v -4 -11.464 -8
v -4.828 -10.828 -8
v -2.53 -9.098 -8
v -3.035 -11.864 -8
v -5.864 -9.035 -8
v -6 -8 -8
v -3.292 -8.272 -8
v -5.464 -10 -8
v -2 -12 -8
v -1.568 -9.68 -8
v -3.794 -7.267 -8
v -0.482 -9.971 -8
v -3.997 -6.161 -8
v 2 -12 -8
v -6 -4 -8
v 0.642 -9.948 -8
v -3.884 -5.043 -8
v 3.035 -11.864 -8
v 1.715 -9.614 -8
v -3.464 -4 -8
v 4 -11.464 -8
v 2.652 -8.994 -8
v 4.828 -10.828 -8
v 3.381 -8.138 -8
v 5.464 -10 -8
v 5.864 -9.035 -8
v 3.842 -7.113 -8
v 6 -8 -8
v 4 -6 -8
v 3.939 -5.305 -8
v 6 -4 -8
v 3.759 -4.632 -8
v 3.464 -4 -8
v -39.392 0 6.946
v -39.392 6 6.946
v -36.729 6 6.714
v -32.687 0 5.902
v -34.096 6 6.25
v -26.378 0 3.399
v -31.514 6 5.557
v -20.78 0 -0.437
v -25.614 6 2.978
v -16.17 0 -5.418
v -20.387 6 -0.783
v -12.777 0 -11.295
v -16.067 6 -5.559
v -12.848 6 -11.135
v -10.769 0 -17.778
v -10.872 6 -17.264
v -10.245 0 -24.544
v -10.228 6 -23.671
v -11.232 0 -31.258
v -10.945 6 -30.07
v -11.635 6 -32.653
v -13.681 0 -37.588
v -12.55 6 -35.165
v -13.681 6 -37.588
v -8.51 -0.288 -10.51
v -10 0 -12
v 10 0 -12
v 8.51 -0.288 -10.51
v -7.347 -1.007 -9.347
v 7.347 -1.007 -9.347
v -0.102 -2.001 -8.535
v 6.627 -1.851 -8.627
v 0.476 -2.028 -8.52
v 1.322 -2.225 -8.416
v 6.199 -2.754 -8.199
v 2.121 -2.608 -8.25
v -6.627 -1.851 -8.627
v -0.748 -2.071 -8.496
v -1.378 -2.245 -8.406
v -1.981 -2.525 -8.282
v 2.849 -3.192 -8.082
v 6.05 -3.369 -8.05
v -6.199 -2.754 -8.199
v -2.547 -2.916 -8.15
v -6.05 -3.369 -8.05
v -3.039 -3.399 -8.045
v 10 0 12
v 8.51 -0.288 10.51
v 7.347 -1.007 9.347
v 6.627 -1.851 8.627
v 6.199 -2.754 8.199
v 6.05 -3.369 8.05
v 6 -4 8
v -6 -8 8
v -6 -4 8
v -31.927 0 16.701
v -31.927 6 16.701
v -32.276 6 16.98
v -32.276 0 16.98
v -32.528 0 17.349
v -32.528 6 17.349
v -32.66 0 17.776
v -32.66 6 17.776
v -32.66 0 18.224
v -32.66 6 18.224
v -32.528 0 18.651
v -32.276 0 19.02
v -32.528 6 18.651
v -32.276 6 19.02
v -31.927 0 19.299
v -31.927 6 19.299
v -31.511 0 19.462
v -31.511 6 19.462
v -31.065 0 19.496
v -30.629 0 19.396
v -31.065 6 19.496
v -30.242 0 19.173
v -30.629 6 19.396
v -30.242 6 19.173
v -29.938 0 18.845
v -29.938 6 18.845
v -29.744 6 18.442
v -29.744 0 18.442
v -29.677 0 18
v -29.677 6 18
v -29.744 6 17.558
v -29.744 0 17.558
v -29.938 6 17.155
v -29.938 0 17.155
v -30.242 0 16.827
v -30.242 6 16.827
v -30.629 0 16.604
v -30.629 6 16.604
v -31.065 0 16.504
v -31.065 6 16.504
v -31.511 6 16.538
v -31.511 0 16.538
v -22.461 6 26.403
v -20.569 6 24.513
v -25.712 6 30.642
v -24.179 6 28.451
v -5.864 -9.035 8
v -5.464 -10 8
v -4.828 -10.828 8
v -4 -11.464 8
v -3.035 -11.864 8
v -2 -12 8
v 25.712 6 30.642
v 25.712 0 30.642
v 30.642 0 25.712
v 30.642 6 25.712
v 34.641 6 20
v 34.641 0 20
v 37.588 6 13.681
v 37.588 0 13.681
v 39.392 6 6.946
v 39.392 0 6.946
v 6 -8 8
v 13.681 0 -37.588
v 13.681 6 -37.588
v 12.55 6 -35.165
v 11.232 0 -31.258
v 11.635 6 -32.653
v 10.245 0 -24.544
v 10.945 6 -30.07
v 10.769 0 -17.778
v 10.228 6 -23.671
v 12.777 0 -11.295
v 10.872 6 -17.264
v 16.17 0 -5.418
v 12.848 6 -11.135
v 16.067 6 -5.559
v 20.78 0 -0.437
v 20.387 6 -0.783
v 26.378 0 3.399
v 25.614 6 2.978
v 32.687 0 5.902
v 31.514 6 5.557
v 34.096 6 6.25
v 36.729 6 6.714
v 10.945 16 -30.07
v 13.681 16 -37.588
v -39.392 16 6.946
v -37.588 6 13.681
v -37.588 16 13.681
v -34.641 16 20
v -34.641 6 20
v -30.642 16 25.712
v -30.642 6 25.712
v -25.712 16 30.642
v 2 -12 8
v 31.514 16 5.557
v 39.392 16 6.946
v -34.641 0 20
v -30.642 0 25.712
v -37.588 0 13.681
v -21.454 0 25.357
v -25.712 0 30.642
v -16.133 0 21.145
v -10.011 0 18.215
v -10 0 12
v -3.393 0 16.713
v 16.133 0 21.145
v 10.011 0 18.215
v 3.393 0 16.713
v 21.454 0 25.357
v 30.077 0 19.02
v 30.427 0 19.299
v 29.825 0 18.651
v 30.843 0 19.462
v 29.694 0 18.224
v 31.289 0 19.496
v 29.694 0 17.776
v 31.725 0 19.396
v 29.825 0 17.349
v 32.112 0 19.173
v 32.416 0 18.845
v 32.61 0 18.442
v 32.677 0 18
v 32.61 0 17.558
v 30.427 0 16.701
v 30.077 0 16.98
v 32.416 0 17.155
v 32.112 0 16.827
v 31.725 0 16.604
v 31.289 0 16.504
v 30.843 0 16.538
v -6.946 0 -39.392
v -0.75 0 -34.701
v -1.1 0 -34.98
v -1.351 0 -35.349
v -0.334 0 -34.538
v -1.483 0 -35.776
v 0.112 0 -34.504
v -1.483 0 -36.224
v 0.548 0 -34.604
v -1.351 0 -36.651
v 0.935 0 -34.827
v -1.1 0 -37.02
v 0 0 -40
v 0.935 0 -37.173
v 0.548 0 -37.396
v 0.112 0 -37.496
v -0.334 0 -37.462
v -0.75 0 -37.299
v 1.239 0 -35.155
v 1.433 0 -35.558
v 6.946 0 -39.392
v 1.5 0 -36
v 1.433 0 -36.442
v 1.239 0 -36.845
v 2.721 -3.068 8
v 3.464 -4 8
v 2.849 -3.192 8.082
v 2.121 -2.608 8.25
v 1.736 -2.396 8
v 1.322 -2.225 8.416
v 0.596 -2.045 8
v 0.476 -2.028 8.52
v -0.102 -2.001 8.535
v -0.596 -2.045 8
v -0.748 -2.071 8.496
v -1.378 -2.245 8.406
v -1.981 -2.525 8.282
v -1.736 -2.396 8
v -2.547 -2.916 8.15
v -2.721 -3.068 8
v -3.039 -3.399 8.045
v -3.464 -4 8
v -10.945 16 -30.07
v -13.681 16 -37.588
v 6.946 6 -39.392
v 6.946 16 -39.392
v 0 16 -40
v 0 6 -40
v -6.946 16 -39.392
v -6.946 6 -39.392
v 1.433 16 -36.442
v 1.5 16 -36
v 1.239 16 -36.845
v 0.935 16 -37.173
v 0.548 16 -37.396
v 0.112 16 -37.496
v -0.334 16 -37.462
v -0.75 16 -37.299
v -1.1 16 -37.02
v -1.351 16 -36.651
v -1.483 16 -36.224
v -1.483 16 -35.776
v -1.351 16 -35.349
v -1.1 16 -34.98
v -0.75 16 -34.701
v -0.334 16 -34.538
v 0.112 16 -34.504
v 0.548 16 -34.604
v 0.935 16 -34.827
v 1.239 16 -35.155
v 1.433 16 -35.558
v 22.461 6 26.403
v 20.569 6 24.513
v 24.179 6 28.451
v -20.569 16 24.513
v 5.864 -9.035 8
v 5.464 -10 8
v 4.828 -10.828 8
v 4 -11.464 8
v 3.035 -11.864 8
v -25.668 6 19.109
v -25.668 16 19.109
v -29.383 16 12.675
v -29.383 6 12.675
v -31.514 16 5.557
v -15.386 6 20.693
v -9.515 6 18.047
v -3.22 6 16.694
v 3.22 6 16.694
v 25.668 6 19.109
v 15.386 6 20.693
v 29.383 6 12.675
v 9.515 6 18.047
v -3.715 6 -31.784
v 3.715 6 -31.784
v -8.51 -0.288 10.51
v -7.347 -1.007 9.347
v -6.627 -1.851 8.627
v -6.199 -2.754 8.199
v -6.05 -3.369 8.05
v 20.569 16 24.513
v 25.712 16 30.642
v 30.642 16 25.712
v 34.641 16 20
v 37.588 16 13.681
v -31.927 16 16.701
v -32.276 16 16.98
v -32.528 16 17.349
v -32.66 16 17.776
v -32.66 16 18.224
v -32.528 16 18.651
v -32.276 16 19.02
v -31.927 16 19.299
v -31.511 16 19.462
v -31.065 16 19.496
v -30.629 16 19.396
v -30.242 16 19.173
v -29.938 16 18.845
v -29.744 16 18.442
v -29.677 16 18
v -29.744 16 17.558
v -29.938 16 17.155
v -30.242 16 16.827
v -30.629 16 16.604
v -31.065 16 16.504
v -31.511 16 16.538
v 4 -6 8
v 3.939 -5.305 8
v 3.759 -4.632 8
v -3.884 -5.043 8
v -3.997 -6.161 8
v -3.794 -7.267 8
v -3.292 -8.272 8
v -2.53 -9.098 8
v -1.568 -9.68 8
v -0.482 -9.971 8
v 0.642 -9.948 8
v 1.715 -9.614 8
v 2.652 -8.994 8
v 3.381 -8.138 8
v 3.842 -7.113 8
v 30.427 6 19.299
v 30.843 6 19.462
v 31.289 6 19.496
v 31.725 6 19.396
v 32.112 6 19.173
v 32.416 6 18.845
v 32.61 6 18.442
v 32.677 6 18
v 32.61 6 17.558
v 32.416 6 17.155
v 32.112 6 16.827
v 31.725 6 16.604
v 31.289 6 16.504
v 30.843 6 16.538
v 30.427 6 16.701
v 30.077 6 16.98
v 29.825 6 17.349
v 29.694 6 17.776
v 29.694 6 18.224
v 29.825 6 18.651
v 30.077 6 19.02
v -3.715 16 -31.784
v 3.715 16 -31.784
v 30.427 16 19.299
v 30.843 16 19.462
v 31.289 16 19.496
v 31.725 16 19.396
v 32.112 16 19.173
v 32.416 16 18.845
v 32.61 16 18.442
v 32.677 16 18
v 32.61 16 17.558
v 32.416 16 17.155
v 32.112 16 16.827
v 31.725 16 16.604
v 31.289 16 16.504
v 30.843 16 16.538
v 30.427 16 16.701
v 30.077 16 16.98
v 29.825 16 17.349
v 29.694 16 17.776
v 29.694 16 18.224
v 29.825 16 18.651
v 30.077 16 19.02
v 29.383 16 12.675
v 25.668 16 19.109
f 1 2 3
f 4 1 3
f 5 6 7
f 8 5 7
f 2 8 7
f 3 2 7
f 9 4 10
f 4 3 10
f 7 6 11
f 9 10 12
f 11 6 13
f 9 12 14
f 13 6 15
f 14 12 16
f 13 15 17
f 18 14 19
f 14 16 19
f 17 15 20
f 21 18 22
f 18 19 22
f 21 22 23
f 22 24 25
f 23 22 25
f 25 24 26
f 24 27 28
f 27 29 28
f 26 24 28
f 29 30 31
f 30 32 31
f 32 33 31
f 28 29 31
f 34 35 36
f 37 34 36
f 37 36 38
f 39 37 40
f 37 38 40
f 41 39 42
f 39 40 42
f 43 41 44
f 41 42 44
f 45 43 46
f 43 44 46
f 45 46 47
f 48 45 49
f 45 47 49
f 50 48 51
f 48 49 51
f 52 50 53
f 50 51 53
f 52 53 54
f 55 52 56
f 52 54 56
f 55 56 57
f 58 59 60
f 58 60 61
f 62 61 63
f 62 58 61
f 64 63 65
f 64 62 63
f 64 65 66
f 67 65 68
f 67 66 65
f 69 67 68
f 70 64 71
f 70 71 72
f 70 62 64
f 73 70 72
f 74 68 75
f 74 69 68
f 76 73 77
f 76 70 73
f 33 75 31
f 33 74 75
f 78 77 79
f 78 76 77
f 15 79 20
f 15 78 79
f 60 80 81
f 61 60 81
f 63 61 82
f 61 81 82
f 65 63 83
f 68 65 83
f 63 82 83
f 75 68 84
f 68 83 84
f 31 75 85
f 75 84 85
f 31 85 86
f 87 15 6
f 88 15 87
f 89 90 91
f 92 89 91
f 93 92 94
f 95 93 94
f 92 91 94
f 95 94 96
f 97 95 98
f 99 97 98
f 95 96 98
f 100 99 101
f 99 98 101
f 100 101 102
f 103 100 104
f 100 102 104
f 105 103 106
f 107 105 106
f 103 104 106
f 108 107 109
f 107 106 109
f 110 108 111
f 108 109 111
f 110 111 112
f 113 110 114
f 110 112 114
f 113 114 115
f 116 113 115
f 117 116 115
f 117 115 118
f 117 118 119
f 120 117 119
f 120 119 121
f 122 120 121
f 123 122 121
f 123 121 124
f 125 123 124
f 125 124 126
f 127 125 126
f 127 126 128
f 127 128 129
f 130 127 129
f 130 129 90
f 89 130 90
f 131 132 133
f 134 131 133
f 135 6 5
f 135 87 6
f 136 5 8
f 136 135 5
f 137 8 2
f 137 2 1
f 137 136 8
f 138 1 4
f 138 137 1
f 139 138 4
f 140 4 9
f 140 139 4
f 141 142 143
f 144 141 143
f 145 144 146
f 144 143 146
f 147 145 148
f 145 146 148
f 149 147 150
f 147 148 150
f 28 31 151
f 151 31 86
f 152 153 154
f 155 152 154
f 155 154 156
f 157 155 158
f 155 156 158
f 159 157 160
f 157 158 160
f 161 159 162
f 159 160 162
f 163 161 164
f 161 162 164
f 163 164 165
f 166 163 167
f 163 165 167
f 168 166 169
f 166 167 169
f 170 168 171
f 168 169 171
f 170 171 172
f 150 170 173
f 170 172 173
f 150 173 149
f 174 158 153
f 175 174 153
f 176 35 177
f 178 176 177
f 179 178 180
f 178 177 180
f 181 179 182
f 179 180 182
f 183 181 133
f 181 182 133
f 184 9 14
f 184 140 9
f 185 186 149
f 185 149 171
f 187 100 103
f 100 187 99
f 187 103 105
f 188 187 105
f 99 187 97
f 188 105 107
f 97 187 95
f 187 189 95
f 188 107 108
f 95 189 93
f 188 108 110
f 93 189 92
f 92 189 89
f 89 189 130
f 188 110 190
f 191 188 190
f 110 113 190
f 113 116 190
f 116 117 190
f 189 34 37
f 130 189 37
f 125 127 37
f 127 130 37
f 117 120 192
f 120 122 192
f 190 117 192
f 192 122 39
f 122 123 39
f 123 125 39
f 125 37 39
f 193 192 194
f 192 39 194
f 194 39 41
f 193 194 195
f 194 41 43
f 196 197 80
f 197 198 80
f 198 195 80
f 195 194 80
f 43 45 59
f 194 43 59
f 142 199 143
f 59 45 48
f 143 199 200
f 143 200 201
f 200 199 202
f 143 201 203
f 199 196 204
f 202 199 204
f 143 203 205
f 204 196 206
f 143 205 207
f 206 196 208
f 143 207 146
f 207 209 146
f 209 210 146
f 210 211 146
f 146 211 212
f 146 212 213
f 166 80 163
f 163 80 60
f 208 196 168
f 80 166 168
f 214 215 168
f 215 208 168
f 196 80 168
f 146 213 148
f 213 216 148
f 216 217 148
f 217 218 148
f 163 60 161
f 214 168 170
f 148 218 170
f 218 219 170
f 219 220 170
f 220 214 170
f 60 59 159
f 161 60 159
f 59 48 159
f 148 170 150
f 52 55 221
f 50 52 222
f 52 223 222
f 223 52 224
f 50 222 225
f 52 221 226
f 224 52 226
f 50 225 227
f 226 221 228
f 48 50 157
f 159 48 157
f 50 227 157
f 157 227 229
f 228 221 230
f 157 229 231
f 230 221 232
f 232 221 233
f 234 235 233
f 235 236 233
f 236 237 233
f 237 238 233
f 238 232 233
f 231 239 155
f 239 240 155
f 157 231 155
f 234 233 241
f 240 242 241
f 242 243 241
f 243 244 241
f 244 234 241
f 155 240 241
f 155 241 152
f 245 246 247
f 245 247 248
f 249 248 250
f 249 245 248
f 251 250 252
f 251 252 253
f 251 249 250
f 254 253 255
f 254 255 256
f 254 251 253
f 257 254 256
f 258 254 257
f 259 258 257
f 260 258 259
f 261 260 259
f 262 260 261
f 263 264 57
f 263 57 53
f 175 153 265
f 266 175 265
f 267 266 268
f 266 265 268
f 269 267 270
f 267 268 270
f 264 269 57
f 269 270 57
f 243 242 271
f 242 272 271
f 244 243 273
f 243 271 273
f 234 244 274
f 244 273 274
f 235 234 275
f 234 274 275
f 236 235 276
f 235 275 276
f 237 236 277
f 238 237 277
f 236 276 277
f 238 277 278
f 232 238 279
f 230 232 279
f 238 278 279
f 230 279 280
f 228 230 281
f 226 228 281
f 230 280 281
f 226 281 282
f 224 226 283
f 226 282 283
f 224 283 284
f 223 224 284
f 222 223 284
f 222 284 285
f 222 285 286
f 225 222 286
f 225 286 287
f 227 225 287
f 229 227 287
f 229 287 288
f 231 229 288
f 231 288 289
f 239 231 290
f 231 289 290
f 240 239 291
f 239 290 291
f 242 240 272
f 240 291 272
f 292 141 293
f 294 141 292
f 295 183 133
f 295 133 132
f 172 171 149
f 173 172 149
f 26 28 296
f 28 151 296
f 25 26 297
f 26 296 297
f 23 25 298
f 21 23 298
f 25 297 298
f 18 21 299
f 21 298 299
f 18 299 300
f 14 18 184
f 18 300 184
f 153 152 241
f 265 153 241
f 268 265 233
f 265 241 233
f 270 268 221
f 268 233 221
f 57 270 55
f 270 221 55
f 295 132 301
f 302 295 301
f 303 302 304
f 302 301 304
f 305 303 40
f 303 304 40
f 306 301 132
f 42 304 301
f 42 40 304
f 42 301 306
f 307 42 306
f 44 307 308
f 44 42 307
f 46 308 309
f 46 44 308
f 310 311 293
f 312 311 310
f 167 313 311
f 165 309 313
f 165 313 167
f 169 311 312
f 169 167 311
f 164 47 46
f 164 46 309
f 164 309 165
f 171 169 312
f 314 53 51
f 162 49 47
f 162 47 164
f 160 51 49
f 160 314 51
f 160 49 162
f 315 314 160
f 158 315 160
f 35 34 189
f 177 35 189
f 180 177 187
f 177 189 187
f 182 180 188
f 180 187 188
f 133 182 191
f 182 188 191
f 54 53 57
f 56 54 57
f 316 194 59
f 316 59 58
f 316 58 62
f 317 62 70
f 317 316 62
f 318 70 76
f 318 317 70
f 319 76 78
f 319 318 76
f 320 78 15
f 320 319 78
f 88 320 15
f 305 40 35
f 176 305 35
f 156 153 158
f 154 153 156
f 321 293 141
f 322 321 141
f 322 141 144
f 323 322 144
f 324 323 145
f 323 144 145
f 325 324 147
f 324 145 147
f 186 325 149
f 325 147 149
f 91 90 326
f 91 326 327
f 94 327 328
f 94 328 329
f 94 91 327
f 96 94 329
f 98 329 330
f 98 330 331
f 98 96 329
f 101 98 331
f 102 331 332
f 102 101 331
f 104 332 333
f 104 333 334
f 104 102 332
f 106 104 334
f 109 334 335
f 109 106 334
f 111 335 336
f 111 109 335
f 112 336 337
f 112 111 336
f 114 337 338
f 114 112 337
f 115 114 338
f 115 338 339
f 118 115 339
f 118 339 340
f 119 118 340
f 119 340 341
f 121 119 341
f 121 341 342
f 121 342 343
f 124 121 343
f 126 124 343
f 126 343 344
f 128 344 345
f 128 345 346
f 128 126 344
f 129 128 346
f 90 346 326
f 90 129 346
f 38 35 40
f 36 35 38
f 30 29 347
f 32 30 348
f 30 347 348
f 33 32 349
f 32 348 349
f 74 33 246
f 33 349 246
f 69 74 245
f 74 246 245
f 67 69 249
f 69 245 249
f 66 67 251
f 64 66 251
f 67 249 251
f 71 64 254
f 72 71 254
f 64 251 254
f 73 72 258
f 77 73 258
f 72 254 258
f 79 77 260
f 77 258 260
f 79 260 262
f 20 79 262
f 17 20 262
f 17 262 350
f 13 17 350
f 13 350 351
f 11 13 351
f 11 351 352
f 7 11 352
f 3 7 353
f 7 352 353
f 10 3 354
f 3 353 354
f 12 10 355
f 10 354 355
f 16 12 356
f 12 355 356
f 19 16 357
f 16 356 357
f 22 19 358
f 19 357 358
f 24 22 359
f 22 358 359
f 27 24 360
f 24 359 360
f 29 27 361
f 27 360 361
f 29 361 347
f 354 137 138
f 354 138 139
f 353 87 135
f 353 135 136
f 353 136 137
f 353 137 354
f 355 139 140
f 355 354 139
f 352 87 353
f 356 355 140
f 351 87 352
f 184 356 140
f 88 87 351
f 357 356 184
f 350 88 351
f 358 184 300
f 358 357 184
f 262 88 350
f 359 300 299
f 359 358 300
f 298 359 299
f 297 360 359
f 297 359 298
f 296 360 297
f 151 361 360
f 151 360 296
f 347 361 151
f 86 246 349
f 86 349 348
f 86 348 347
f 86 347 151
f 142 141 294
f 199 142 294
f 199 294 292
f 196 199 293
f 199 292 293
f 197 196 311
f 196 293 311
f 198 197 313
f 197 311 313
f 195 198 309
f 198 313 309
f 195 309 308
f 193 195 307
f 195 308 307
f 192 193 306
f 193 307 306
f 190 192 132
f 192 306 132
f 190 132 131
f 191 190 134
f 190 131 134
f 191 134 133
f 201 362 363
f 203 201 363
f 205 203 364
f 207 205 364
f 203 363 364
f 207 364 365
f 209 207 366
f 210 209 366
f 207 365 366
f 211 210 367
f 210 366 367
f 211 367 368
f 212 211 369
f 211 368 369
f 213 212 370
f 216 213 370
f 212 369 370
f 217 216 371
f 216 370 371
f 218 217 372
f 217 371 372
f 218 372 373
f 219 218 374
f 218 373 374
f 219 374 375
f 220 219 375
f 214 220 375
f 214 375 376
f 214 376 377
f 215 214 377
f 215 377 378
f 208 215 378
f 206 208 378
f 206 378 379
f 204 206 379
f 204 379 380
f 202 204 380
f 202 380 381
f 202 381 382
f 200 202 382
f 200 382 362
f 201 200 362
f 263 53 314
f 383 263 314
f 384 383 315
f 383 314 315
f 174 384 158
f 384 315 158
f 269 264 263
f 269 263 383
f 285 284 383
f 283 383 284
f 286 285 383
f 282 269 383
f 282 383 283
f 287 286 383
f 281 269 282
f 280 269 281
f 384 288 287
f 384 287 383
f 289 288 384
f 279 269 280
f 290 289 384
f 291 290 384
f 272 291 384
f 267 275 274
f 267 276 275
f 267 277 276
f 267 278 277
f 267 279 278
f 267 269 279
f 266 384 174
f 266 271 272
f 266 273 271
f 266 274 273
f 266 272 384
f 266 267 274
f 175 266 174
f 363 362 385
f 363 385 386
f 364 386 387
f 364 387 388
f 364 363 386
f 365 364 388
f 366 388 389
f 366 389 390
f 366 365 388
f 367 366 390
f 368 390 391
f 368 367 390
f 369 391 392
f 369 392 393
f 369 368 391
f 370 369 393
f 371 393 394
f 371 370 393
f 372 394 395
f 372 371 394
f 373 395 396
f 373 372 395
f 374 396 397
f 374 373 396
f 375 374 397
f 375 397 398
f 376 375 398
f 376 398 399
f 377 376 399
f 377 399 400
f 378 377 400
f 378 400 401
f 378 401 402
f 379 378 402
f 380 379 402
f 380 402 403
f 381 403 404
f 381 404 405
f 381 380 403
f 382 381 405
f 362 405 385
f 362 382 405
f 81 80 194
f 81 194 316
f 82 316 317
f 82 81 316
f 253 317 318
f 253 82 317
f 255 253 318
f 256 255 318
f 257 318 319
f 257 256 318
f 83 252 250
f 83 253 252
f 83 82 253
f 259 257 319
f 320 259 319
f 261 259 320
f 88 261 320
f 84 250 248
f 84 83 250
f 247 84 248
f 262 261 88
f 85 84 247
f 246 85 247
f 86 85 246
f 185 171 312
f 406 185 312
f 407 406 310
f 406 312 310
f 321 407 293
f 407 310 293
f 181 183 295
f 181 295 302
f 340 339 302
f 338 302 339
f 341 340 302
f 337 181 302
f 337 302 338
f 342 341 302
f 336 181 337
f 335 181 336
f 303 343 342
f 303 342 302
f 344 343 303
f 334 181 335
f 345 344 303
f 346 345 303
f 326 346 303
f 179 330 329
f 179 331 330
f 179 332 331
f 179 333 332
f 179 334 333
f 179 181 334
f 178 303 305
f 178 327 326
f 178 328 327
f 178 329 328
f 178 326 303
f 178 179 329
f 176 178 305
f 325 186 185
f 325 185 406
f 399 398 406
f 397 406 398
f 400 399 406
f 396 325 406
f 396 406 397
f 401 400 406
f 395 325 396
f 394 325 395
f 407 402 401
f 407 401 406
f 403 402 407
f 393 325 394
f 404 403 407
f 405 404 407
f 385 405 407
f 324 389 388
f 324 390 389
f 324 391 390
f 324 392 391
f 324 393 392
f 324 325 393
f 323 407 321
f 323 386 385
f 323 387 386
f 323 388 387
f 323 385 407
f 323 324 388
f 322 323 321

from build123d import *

# Parameters (mm, degrees)
SKETCH1_R                = 40
BOSS_EXTRUDE1_DEPTH      = 6
SKETCH2_R                = 1.5
BOSS_EXTRUDE2_DEPTH      = 10
SKETCH16_R               = 1.5
CUT_EXTRUDE9_DEPTH       = 17
CIRPATTERN1_COUNT        = 3
SKETCH5_R                = 30.471270003
CUT_EXTRUDE3_DEPTH       = 7
CIRPATTERN2_COUNT        = 3
SKETCH17_W               = 12
SKETCH17_H               = 16
BOSS_EXTRUDE3_DEPTH      = 12
FILLET1_R                = 4
FILLET2_R                = 4
SKETCH18_R               = 4
CUT_EXTRUDE10_DEPTH      = 23.641777725
CUT_EXTRUDE10_DEPTH_BACK = 49


with BuildPart() as part:
    # Sketch1 → Boss-Extrude1 (new body)
    with BuildSketch(Plane(origin=(0, 0, 0), x_dir=(1, 0, 0), z_dir=(0, 1, 0))):
        Circle(SKETCH1_R)
    extrude(amount=BOSS_EXTRUDE1_DEPTH)

    # Sketch2 → Boss-Extrude2 (add)
    with BuildSketch(Plane(origin=(0, 6, 0), x_dir=(1, 0, 0), z_dir=(0, 1, 0))):
        with BuildLine():
            Line((-13.680805733, 37.587704831), (-10.944644586, 30.070163865))
            ThreePointArc((-10.944644586, 30.070163865), (0, 32), (10.944644586, 30.070163865))
            Line((10.944644586, 30.070163865), (13.680805733, 37.587704831))
            ThreePointArc((13.680805733, 37.587704831), (0, 40), (-13.680805733, 37.587704831))
        make_face()
        with Locations((0, 36)):
            Circle(SKETCH2_R, mode=Mode.SUBTRACT)
    boss_extrude2 = extrude(amount=BOSS_EXTRUDE2_DEPTH)

    # Sketch16 → Cut-Extrude9 (cut, through all)
    with BuildSketch(Plane(origin=(0, 16, 0), x_dir=(1, 0, 0), z_dir=(0, 1, 0))):
        with Locations((0, 36)):
            Circle(SKETCH16_R)
    cut_extrude9 = extrude(amount=-CUT_EXTRUDE9_DEPTH, mode=Mode.SUBTRACT)

    # CirPattern1: Boss-Extrude2, Cut-Extrude9 ×3 about axis
    cirpattern1_axis = Axis((0, 0, 0), (0, 1, 0))
    for i in range(1, CIRPATTERN1_COUNT):
        add(boss_extrude2.rotate(cirpattern1_axis, i * 360 / CIRPATTERN1_COUNT))
        add(cut_extrude9.rotate(cirpattern1_axis, i * 360 / CIRPATTERN1_COUNT), mode=Mode.SUBTRACT)

    # Sketch5 → Cut-Extrude3 (cut, through all)
    with BuildSketch(Plane(origin=(0, 6, 0), x_dir=(1, 0, 0), z_dir=(0, 1, 0))):
        with Locations((40.698571494, 23.497331208)):
            Circle(SKETCH5_R)
    cut_extrude3 = extrude(amount=-CUT_EXTRUDE3_DEPTH, mode=Mode.SUBTRACT)

    # CirPattern2: Cut-Extrude3 ×3 about axis
    cirpattern2_axis = Axis((0, 0, 0), (0, 1, 0))
    for i in range(1, CIRPATTERN2_COUNT):
        add(cut_extrude3.rotate(cirpattern2_axis, i * 360 / CIRPATTERN2_COUNT), mode=Mode.SUBTRACT)

    # Sketch17 → Boss-Extrude3 (add)
    with BuildSketch(Plane.XZ):
        Rectangle(SKETCH17_W, SKETCH17_H)
    extrude(amount=BOSS_EXTRUDE3_DEPTH)

    # Fillet1
    fillet1_edges = [part.edges().sort_by_distance(p)[0] for p in [
        (-6, 0, 0),
        (6, 0, 0),
        (-6, -12, 0),
        (6, -12, 0),
    ]]
    fillet(fillet1_edges, radius=FILLET1_R)

    # Fillet2
    fillet2_edges = [part.edges().sort_by_distance(p)[0] for p in [
        (0, 0, 8),
        (0, 0, -8),
    ]]
    fillet(fillet2_edges, radius=FILLET2_R)

    # Sketch18 → Cut-Extrude10 (cut, two sides)
    with BuildSketch(Plane.XY.offset(8)) as cut_extrude10_sk:
        with Locations((0, -6)):
            Circle(SKETCH18_R)
    extrude(amount=CUT_EXTRUDE10_DEPTH, mode=Mode.SUBTRACT)
    extrude(cut_extrude10_sk.sketch, amount=-CUT_EXTRUDE10_DEPTH_BACK, mode=Mode.SUBTRACT)


solid = part.part
